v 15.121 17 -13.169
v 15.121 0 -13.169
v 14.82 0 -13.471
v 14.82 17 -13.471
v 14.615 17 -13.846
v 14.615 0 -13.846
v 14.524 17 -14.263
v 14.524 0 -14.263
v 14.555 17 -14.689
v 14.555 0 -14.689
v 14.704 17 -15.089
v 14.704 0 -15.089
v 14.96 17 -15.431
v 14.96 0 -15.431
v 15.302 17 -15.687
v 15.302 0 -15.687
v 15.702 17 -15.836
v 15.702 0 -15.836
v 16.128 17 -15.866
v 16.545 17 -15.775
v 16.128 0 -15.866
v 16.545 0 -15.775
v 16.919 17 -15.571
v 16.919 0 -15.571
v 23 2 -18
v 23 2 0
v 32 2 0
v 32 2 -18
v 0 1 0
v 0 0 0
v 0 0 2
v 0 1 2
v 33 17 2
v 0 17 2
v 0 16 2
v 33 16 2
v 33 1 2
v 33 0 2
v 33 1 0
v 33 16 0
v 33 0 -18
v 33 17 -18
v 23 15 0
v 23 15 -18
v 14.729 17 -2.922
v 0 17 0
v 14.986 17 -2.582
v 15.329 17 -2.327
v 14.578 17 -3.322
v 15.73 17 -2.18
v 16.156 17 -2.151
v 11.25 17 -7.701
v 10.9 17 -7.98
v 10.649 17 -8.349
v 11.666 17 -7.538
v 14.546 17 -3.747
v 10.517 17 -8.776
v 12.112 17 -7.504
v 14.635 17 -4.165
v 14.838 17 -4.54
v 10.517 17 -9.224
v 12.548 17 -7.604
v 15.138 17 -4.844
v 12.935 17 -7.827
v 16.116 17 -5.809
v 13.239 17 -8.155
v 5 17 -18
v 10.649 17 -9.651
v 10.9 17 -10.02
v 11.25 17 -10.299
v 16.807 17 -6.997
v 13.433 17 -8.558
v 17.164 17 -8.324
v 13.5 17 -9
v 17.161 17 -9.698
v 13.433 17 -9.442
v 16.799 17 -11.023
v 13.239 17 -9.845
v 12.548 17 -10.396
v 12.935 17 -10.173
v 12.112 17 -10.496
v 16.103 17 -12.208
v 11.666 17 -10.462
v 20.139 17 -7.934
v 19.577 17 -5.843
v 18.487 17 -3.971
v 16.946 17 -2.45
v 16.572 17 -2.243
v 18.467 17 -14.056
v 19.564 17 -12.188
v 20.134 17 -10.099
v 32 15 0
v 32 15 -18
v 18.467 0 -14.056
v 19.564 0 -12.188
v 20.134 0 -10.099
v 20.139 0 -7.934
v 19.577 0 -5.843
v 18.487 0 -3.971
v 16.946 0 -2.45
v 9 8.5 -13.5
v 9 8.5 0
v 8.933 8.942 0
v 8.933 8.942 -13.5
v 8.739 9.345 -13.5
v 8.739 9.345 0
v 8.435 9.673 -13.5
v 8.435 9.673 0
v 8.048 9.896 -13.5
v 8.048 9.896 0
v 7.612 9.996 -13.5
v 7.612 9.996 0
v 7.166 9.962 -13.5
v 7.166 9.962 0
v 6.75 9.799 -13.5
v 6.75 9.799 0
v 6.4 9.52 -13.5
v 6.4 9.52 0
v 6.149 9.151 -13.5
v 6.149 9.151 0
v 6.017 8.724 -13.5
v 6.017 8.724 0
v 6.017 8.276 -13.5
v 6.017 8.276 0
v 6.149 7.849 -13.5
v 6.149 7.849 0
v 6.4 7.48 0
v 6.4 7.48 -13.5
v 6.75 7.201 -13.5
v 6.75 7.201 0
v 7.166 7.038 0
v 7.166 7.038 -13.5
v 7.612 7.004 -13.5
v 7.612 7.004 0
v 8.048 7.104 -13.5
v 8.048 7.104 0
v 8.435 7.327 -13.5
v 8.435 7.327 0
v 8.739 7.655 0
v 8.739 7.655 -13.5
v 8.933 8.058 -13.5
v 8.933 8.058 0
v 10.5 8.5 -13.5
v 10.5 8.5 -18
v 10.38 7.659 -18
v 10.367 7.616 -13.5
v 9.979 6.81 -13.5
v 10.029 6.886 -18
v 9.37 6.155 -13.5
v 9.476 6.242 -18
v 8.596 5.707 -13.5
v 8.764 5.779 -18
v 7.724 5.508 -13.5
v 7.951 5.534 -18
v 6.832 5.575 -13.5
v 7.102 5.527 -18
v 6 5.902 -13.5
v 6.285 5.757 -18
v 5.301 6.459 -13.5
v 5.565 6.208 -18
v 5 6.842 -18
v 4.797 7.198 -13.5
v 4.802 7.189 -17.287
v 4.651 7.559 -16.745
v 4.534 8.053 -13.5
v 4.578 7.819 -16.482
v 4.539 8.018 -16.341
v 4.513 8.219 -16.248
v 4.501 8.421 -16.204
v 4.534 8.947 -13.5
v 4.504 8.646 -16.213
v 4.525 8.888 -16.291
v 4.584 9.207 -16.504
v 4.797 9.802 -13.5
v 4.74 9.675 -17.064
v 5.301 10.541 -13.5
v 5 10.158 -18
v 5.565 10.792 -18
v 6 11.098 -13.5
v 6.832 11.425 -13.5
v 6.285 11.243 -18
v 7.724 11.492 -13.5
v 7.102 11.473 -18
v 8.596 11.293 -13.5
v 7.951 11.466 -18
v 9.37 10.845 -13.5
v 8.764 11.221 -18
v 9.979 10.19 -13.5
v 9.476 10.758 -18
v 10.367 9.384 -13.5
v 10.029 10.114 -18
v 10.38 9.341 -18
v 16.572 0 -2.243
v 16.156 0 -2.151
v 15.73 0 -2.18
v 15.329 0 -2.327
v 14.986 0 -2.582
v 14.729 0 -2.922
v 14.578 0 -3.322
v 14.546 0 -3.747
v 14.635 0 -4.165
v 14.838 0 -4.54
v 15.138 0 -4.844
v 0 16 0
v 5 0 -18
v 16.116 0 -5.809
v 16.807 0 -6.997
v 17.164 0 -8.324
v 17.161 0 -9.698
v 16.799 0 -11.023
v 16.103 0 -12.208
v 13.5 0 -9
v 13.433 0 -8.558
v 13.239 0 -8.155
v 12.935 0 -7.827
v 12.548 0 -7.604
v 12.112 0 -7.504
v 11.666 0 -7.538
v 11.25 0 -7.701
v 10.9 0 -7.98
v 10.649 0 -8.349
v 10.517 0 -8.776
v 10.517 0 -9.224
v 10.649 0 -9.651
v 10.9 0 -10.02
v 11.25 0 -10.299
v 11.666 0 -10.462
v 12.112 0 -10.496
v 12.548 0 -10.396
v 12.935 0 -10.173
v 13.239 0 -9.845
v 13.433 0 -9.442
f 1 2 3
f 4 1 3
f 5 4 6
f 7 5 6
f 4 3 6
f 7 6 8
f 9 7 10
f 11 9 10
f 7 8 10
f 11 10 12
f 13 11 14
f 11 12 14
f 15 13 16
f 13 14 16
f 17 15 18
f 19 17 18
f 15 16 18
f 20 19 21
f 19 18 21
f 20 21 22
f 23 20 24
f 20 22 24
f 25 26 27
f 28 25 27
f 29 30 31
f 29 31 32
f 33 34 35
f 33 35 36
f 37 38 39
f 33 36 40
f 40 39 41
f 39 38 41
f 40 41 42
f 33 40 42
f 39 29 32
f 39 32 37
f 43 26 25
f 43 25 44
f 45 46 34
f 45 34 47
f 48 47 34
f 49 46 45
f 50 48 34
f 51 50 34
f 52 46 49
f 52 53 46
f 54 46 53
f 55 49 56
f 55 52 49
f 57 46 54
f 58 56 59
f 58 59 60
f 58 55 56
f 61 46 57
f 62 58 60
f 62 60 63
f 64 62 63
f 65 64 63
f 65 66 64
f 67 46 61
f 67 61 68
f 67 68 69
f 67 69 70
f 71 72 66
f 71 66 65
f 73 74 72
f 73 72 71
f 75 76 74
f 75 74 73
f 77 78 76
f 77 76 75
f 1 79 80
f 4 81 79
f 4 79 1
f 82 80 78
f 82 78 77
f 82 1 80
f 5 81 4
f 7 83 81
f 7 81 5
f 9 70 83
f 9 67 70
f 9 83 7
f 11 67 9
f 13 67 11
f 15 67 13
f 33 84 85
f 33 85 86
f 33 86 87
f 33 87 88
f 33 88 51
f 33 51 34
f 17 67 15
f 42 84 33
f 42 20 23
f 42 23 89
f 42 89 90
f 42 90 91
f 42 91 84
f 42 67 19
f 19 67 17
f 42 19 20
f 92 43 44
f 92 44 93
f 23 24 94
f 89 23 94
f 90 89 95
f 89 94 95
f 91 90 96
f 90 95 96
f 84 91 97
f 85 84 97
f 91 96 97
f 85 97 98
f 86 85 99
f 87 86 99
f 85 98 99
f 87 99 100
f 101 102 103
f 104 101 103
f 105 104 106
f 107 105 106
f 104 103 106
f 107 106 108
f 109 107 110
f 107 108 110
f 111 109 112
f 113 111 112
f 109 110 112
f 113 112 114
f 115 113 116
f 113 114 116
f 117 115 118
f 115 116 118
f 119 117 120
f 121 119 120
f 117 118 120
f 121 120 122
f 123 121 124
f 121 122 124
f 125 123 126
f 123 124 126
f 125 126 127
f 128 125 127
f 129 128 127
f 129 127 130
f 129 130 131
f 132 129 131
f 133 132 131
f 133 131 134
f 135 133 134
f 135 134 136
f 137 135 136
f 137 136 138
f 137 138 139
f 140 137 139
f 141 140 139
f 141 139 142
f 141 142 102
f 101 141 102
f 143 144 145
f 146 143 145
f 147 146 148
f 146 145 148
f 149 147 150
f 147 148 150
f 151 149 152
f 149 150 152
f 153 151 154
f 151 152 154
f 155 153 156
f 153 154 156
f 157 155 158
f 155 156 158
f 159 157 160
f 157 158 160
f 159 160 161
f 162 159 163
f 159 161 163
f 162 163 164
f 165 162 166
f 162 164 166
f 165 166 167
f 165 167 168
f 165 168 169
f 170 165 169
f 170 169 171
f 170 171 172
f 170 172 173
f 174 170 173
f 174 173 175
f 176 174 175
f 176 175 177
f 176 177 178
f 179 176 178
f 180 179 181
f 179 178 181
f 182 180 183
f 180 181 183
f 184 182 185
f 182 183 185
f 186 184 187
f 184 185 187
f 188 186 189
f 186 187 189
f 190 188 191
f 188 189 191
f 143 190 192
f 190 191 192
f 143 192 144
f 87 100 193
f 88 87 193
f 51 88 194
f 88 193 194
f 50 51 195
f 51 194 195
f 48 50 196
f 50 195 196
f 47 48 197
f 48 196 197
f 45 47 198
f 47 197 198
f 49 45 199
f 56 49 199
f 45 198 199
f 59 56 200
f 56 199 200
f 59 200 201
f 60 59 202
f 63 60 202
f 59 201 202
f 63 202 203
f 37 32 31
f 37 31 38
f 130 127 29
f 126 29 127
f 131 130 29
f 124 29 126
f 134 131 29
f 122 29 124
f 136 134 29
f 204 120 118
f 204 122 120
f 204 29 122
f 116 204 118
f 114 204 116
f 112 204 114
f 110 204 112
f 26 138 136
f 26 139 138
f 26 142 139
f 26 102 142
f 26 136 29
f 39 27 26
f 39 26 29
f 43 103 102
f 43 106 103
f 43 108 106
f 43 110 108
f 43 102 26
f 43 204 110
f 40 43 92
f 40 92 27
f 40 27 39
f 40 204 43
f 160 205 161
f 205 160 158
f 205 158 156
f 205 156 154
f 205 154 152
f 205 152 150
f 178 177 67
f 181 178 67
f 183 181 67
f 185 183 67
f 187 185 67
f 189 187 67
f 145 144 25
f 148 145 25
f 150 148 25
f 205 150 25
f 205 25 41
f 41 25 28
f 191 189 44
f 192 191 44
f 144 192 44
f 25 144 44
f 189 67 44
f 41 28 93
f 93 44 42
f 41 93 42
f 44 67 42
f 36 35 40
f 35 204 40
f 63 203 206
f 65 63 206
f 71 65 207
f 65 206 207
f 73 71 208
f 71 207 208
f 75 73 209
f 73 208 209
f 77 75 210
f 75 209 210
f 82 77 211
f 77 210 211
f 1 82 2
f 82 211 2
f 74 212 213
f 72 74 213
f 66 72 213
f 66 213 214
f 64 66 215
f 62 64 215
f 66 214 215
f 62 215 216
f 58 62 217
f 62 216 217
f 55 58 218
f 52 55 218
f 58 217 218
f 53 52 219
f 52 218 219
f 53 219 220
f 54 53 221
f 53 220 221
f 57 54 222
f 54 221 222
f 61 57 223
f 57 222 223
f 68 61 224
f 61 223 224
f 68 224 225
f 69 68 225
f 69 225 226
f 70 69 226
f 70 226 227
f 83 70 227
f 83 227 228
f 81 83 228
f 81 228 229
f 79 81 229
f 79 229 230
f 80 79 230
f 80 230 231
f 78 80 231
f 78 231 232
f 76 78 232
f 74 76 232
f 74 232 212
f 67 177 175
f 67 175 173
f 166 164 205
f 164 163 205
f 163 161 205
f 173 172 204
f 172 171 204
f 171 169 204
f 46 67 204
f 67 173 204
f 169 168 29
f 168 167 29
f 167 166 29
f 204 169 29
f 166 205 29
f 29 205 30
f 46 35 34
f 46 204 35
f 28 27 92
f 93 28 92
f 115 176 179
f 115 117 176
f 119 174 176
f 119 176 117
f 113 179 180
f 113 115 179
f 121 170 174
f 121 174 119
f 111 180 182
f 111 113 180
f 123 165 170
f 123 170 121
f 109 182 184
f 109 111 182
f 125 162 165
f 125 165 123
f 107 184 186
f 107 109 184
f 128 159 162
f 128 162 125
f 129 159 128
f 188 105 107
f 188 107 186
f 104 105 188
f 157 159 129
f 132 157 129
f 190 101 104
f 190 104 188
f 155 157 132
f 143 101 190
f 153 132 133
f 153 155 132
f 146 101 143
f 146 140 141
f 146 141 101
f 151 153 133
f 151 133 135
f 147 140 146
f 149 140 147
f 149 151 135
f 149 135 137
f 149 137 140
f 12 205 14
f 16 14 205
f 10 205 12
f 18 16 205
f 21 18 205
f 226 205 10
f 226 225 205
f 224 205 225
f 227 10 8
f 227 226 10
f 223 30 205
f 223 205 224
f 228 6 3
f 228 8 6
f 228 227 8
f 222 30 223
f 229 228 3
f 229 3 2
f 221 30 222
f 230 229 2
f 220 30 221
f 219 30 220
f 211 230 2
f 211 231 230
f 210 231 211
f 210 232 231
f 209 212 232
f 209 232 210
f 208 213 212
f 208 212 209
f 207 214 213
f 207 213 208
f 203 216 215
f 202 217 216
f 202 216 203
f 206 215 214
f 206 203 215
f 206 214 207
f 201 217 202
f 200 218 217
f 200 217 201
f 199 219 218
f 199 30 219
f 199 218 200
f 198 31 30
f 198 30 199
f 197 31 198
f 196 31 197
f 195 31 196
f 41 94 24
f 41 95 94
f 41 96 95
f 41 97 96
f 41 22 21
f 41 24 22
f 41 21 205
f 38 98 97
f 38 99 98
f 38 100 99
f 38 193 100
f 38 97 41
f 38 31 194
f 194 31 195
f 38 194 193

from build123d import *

# Parameters (mm, degrees)
F0_W     = 33
F0_H     = 1
F0_H_2   = 15
F0_R     = 1.5
F0_W_2   = 9
F0_H_3   = 13
F1_DEPTH = 18
F3_DEPTH = 17.001
F4_R     = 1.5
F5_DEPTH = 17.001
F6_R     = 3
F7_DEPTH = 4.5
F8_DEPTH = 1
F9_DEPTH = 1


with BuildPart() as f1:
    # F0 (on Top) → F1 (new body)
    with BuildSketch(Plane.XY):
        with Locations((16.5, 0.5)):
            Rectangle(F0_W, F0_H)
        with Locations((16.5, 8.5)):
            Rectangle(F0_W, F0_H_2)
        with Locations((7.5, 8.5)):
            Circle(F0_R, mode=Mode.SUBTRACT)
        with Locations((27.5, 8.5)):
            Rectangle(F0_W_2, F0_H_3, mode=Mode.SUBTRACT)
        with Locations((16.5, 16.5)):
            Rectangle(F0_W, F0_H)
    extrude(amount=-F1_DEPTH)

    # F2 (on face) → F3 (cut, through all)
    with BuildSketch(Plane.XZ):
        Polygon((5, -18), (0, 0), (0, -18), align=None)
    extrude(amount=-F3_DEPTH, mode=Mode.SUBTRACT)

    # F4 (on face) → F5 (cut, through all)
    with BuildSketch(Plane.XZ):
        with Locations((12, -9)):
            Circle(F4_R)
        with BuildLine():
            ThreePointArc((16.9193976722, -15.5707030324), (20.2081866768, -9.0168308246), (16.9463025453, -2.4495265112))
            ThreePointArc((16.9463025453, -2.4495265112), (14.8453357329, -2.7426791223), (15.138488344, -4.8436459346))
            ThreePointArc((15.138488344, -4.8436459346), (17.2081929835, -9.0106793603), (15.1214168791, -13.1691899537))
            ThreePointArc((15.1214168791, -13.1691899537), (14.8196507362, -15.2689368896), (16.9193976722, -15.5707030324))
        make_face()
    extrude(amount=-F5_DEPTH, mode=Mode.SUBTRACT)

    # F6 (on face) → F7 (cut)
    with BuildSketch(Plane(origin=(0, 0, -18), x_dir=(1, 0, 0), z_dir=(0, 0, -1))):
        with Locations((7.5, -8.5)):
            Circle(F6_R)
    extrude(amount=-F7_DEPTH, mode=Mode.SUBTRACT)

    # F0 (on Top) → F8 (join)
    with BuildSketch(Plane.XY):
        with Locations((16.5, 16.5)):
            Rectangle(F0_W, F0_H)
        with Locations((16.5, 0.5)):
            Rectangle(F0_W, F0_H)
    extrude(amount=F8_DEPTH)

    # F9 (add): faces of the model
    f9_faces = [f1.faces().sort_by_distance(p)[0] for p in [
        (16.5, 16.5, 1),
        (16.5, 0.5, 1),
    ]]
    extrude(f9_faces, amount=F9_DEPTH)


solid = f1.part
